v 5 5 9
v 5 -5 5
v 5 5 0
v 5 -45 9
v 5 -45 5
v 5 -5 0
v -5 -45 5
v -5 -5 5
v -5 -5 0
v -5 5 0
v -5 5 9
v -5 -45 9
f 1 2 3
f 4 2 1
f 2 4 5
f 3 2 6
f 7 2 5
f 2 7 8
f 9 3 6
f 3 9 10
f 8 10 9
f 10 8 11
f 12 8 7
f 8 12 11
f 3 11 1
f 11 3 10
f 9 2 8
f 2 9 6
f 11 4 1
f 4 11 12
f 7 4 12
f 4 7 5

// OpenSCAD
//rotate([0,0,90]) 
union() {
   translate([-10/2,-10/2,0]) cube([10,10,5]);
   translate([-10/2,-50+5,5]) cube([10,50,4]);
}
